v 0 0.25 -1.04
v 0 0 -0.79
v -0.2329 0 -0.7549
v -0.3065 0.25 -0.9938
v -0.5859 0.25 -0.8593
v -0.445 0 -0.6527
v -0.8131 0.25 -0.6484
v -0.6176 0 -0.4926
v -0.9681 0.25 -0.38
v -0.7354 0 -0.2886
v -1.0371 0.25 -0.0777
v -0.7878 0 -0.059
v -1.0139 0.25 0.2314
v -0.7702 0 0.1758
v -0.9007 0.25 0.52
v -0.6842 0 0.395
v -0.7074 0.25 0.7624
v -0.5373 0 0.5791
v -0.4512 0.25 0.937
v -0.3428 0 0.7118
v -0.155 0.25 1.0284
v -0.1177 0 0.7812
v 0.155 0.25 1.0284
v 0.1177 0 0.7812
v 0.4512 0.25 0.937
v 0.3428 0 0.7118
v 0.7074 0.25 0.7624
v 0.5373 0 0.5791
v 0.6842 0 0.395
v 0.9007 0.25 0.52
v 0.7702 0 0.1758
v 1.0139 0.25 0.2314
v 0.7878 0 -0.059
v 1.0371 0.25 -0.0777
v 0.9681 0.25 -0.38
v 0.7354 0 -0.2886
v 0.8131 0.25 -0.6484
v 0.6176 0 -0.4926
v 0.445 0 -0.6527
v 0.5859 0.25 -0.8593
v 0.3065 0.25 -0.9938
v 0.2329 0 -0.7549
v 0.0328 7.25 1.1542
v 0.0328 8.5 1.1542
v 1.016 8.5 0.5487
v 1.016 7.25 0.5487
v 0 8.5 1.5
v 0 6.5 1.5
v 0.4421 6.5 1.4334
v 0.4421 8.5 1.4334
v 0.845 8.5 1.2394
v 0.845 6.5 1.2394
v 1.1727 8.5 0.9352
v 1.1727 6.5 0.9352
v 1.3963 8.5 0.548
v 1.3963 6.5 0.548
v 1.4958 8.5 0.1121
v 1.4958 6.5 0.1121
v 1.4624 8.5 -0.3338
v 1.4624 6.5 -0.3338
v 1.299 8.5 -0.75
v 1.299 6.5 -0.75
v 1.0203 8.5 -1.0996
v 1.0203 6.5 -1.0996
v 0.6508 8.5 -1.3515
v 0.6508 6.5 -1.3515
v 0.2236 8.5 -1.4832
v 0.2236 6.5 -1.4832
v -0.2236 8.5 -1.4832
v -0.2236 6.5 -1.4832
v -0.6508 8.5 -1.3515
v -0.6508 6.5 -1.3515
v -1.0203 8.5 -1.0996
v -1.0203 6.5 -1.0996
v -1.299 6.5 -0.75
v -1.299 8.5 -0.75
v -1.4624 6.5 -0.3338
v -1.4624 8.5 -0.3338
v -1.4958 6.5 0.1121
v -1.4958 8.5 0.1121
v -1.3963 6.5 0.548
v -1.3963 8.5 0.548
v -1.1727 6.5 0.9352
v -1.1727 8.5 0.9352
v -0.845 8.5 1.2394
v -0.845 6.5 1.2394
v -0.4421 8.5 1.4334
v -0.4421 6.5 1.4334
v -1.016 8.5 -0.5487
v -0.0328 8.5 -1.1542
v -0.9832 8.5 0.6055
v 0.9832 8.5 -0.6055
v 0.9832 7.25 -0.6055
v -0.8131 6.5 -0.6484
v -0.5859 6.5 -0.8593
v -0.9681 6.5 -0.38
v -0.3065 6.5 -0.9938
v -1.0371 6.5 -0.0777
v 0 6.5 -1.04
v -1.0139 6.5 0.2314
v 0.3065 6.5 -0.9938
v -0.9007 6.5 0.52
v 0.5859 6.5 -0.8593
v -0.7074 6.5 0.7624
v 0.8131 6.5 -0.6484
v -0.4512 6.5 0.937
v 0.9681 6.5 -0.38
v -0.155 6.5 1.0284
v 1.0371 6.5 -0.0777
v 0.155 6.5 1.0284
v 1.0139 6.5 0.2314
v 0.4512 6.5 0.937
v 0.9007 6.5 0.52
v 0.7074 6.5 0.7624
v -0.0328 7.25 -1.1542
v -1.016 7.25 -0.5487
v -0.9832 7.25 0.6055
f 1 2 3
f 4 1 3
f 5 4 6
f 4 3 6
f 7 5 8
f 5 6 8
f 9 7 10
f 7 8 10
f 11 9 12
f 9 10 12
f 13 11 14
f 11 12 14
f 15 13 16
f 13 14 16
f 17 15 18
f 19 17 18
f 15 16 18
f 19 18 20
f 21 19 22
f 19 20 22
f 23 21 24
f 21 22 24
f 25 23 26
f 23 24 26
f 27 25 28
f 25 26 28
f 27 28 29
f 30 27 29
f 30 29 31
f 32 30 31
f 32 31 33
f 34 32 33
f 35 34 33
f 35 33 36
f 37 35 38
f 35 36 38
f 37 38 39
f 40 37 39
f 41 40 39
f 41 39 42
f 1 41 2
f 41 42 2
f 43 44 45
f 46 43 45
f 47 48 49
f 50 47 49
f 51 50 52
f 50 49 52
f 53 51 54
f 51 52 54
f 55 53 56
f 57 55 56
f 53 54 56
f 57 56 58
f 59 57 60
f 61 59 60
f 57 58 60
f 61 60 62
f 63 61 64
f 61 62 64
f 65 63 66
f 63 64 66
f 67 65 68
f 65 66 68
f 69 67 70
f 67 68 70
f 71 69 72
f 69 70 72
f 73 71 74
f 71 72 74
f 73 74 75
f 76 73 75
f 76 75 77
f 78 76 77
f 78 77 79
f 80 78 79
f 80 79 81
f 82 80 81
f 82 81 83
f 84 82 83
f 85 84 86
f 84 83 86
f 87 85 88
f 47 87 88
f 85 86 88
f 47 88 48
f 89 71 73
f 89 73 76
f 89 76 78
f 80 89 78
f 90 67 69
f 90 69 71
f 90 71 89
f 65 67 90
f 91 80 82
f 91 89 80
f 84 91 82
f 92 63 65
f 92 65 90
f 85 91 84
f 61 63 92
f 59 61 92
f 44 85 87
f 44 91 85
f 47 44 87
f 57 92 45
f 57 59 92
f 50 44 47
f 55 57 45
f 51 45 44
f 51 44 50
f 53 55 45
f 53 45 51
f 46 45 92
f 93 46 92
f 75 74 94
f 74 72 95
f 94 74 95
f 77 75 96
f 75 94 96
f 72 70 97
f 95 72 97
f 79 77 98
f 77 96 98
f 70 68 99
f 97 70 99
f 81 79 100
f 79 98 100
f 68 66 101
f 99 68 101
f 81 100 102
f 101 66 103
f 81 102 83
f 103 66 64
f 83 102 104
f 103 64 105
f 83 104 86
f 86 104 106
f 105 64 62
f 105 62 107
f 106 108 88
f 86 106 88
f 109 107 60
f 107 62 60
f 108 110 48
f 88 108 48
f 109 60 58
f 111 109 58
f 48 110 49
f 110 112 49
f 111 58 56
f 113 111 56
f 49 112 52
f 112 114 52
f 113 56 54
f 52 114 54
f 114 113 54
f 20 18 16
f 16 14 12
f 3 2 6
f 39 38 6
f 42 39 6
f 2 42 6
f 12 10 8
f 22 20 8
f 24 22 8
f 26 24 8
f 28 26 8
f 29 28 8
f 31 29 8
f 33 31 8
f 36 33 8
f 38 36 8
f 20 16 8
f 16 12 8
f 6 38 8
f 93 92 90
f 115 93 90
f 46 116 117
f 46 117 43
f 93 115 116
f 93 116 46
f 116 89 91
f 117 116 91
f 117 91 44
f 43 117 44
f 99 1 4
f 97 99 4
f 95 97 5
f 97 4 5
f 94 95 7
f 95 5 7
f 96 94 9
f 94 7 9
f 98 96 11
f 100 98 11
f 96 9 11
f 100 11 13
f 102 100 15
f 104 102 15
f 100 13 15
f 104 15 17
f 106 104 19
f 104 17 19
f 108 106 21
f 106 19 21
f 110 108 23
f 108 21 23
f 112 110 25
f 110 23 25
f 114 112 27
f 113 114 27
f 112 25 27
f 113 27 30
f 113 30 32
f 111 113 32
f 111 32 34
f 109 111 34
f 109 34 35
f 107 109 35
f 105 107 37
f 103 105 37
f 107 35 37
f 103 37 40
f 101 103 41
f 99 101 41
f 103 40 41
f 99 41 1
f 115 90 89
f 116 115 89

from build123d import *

# Parameters (mm, degrees)
SKETCH1_R           = 1.04
BOSS_EXTRUDE1_DEPTH = 6.5
SKETCH2_R           = 1.5
BOSS_EXTRUDE2_DEPTH = 2
CUT_EXTRUDE1_DEPTH  = 1.25
CHAMFER1_SIZE       = 0.25


with BuildPart() as part:
    # Sketch1 → Boss-Extrude1 (new body)
    with BuildSketch(Plane(origin=(0, 0, 0), x_dir=(1, 0, 0), z_dir=(0, 1, 0))):
        with Locations(Location((0, 0, 0), (0, 0, 90))):
            Circle(SKETCH1_R)
    extrude(amount=BOSS_EXTRUDE1_DEPTH)

    # Sketch2 → Boss-Extrude2 (add)
    with BuildSketch(Plane(origin=(0, 6.5, 0), x_dir=(1, 0, 0), z_dir=(0, 1, 0))):
        with Locations(Location((0, 0, 0), (0, 0, 270))):
            Circle(SKETCH2_R)
    extrude(amount=BOSS_EXTRUDE2_DEPTH)

    # Sketch3 → Cut-Extrude1 (cut)
    with BuildSketch(Plane(origin=(0, 8.5, 0), x_dir=(1, 0, 0), z_dir=(0, 1, 0))):
        Polygon((-0.032777471, 1.154235232), (-1.015985768, 0.548731493), (-0.983208297, -0.605503739), (0.032777471, -1.154235232), (1.015985768, -0.548731493), (0.983208297, 0.605503739), align=None)
    extrude(amount=-CUT_EXTRUDE1_DEPTH, mode=Mode.SUBTRACT)

    # Chamfer1
    chamfer1_edges = [part.edges().sort_by_distance(p)[0] for p in [
        (0, 0, 1.04),
    ]]
    chamfer(chamfer1_edges, length=CHAMFER1_SIZE)


solid = part.part
